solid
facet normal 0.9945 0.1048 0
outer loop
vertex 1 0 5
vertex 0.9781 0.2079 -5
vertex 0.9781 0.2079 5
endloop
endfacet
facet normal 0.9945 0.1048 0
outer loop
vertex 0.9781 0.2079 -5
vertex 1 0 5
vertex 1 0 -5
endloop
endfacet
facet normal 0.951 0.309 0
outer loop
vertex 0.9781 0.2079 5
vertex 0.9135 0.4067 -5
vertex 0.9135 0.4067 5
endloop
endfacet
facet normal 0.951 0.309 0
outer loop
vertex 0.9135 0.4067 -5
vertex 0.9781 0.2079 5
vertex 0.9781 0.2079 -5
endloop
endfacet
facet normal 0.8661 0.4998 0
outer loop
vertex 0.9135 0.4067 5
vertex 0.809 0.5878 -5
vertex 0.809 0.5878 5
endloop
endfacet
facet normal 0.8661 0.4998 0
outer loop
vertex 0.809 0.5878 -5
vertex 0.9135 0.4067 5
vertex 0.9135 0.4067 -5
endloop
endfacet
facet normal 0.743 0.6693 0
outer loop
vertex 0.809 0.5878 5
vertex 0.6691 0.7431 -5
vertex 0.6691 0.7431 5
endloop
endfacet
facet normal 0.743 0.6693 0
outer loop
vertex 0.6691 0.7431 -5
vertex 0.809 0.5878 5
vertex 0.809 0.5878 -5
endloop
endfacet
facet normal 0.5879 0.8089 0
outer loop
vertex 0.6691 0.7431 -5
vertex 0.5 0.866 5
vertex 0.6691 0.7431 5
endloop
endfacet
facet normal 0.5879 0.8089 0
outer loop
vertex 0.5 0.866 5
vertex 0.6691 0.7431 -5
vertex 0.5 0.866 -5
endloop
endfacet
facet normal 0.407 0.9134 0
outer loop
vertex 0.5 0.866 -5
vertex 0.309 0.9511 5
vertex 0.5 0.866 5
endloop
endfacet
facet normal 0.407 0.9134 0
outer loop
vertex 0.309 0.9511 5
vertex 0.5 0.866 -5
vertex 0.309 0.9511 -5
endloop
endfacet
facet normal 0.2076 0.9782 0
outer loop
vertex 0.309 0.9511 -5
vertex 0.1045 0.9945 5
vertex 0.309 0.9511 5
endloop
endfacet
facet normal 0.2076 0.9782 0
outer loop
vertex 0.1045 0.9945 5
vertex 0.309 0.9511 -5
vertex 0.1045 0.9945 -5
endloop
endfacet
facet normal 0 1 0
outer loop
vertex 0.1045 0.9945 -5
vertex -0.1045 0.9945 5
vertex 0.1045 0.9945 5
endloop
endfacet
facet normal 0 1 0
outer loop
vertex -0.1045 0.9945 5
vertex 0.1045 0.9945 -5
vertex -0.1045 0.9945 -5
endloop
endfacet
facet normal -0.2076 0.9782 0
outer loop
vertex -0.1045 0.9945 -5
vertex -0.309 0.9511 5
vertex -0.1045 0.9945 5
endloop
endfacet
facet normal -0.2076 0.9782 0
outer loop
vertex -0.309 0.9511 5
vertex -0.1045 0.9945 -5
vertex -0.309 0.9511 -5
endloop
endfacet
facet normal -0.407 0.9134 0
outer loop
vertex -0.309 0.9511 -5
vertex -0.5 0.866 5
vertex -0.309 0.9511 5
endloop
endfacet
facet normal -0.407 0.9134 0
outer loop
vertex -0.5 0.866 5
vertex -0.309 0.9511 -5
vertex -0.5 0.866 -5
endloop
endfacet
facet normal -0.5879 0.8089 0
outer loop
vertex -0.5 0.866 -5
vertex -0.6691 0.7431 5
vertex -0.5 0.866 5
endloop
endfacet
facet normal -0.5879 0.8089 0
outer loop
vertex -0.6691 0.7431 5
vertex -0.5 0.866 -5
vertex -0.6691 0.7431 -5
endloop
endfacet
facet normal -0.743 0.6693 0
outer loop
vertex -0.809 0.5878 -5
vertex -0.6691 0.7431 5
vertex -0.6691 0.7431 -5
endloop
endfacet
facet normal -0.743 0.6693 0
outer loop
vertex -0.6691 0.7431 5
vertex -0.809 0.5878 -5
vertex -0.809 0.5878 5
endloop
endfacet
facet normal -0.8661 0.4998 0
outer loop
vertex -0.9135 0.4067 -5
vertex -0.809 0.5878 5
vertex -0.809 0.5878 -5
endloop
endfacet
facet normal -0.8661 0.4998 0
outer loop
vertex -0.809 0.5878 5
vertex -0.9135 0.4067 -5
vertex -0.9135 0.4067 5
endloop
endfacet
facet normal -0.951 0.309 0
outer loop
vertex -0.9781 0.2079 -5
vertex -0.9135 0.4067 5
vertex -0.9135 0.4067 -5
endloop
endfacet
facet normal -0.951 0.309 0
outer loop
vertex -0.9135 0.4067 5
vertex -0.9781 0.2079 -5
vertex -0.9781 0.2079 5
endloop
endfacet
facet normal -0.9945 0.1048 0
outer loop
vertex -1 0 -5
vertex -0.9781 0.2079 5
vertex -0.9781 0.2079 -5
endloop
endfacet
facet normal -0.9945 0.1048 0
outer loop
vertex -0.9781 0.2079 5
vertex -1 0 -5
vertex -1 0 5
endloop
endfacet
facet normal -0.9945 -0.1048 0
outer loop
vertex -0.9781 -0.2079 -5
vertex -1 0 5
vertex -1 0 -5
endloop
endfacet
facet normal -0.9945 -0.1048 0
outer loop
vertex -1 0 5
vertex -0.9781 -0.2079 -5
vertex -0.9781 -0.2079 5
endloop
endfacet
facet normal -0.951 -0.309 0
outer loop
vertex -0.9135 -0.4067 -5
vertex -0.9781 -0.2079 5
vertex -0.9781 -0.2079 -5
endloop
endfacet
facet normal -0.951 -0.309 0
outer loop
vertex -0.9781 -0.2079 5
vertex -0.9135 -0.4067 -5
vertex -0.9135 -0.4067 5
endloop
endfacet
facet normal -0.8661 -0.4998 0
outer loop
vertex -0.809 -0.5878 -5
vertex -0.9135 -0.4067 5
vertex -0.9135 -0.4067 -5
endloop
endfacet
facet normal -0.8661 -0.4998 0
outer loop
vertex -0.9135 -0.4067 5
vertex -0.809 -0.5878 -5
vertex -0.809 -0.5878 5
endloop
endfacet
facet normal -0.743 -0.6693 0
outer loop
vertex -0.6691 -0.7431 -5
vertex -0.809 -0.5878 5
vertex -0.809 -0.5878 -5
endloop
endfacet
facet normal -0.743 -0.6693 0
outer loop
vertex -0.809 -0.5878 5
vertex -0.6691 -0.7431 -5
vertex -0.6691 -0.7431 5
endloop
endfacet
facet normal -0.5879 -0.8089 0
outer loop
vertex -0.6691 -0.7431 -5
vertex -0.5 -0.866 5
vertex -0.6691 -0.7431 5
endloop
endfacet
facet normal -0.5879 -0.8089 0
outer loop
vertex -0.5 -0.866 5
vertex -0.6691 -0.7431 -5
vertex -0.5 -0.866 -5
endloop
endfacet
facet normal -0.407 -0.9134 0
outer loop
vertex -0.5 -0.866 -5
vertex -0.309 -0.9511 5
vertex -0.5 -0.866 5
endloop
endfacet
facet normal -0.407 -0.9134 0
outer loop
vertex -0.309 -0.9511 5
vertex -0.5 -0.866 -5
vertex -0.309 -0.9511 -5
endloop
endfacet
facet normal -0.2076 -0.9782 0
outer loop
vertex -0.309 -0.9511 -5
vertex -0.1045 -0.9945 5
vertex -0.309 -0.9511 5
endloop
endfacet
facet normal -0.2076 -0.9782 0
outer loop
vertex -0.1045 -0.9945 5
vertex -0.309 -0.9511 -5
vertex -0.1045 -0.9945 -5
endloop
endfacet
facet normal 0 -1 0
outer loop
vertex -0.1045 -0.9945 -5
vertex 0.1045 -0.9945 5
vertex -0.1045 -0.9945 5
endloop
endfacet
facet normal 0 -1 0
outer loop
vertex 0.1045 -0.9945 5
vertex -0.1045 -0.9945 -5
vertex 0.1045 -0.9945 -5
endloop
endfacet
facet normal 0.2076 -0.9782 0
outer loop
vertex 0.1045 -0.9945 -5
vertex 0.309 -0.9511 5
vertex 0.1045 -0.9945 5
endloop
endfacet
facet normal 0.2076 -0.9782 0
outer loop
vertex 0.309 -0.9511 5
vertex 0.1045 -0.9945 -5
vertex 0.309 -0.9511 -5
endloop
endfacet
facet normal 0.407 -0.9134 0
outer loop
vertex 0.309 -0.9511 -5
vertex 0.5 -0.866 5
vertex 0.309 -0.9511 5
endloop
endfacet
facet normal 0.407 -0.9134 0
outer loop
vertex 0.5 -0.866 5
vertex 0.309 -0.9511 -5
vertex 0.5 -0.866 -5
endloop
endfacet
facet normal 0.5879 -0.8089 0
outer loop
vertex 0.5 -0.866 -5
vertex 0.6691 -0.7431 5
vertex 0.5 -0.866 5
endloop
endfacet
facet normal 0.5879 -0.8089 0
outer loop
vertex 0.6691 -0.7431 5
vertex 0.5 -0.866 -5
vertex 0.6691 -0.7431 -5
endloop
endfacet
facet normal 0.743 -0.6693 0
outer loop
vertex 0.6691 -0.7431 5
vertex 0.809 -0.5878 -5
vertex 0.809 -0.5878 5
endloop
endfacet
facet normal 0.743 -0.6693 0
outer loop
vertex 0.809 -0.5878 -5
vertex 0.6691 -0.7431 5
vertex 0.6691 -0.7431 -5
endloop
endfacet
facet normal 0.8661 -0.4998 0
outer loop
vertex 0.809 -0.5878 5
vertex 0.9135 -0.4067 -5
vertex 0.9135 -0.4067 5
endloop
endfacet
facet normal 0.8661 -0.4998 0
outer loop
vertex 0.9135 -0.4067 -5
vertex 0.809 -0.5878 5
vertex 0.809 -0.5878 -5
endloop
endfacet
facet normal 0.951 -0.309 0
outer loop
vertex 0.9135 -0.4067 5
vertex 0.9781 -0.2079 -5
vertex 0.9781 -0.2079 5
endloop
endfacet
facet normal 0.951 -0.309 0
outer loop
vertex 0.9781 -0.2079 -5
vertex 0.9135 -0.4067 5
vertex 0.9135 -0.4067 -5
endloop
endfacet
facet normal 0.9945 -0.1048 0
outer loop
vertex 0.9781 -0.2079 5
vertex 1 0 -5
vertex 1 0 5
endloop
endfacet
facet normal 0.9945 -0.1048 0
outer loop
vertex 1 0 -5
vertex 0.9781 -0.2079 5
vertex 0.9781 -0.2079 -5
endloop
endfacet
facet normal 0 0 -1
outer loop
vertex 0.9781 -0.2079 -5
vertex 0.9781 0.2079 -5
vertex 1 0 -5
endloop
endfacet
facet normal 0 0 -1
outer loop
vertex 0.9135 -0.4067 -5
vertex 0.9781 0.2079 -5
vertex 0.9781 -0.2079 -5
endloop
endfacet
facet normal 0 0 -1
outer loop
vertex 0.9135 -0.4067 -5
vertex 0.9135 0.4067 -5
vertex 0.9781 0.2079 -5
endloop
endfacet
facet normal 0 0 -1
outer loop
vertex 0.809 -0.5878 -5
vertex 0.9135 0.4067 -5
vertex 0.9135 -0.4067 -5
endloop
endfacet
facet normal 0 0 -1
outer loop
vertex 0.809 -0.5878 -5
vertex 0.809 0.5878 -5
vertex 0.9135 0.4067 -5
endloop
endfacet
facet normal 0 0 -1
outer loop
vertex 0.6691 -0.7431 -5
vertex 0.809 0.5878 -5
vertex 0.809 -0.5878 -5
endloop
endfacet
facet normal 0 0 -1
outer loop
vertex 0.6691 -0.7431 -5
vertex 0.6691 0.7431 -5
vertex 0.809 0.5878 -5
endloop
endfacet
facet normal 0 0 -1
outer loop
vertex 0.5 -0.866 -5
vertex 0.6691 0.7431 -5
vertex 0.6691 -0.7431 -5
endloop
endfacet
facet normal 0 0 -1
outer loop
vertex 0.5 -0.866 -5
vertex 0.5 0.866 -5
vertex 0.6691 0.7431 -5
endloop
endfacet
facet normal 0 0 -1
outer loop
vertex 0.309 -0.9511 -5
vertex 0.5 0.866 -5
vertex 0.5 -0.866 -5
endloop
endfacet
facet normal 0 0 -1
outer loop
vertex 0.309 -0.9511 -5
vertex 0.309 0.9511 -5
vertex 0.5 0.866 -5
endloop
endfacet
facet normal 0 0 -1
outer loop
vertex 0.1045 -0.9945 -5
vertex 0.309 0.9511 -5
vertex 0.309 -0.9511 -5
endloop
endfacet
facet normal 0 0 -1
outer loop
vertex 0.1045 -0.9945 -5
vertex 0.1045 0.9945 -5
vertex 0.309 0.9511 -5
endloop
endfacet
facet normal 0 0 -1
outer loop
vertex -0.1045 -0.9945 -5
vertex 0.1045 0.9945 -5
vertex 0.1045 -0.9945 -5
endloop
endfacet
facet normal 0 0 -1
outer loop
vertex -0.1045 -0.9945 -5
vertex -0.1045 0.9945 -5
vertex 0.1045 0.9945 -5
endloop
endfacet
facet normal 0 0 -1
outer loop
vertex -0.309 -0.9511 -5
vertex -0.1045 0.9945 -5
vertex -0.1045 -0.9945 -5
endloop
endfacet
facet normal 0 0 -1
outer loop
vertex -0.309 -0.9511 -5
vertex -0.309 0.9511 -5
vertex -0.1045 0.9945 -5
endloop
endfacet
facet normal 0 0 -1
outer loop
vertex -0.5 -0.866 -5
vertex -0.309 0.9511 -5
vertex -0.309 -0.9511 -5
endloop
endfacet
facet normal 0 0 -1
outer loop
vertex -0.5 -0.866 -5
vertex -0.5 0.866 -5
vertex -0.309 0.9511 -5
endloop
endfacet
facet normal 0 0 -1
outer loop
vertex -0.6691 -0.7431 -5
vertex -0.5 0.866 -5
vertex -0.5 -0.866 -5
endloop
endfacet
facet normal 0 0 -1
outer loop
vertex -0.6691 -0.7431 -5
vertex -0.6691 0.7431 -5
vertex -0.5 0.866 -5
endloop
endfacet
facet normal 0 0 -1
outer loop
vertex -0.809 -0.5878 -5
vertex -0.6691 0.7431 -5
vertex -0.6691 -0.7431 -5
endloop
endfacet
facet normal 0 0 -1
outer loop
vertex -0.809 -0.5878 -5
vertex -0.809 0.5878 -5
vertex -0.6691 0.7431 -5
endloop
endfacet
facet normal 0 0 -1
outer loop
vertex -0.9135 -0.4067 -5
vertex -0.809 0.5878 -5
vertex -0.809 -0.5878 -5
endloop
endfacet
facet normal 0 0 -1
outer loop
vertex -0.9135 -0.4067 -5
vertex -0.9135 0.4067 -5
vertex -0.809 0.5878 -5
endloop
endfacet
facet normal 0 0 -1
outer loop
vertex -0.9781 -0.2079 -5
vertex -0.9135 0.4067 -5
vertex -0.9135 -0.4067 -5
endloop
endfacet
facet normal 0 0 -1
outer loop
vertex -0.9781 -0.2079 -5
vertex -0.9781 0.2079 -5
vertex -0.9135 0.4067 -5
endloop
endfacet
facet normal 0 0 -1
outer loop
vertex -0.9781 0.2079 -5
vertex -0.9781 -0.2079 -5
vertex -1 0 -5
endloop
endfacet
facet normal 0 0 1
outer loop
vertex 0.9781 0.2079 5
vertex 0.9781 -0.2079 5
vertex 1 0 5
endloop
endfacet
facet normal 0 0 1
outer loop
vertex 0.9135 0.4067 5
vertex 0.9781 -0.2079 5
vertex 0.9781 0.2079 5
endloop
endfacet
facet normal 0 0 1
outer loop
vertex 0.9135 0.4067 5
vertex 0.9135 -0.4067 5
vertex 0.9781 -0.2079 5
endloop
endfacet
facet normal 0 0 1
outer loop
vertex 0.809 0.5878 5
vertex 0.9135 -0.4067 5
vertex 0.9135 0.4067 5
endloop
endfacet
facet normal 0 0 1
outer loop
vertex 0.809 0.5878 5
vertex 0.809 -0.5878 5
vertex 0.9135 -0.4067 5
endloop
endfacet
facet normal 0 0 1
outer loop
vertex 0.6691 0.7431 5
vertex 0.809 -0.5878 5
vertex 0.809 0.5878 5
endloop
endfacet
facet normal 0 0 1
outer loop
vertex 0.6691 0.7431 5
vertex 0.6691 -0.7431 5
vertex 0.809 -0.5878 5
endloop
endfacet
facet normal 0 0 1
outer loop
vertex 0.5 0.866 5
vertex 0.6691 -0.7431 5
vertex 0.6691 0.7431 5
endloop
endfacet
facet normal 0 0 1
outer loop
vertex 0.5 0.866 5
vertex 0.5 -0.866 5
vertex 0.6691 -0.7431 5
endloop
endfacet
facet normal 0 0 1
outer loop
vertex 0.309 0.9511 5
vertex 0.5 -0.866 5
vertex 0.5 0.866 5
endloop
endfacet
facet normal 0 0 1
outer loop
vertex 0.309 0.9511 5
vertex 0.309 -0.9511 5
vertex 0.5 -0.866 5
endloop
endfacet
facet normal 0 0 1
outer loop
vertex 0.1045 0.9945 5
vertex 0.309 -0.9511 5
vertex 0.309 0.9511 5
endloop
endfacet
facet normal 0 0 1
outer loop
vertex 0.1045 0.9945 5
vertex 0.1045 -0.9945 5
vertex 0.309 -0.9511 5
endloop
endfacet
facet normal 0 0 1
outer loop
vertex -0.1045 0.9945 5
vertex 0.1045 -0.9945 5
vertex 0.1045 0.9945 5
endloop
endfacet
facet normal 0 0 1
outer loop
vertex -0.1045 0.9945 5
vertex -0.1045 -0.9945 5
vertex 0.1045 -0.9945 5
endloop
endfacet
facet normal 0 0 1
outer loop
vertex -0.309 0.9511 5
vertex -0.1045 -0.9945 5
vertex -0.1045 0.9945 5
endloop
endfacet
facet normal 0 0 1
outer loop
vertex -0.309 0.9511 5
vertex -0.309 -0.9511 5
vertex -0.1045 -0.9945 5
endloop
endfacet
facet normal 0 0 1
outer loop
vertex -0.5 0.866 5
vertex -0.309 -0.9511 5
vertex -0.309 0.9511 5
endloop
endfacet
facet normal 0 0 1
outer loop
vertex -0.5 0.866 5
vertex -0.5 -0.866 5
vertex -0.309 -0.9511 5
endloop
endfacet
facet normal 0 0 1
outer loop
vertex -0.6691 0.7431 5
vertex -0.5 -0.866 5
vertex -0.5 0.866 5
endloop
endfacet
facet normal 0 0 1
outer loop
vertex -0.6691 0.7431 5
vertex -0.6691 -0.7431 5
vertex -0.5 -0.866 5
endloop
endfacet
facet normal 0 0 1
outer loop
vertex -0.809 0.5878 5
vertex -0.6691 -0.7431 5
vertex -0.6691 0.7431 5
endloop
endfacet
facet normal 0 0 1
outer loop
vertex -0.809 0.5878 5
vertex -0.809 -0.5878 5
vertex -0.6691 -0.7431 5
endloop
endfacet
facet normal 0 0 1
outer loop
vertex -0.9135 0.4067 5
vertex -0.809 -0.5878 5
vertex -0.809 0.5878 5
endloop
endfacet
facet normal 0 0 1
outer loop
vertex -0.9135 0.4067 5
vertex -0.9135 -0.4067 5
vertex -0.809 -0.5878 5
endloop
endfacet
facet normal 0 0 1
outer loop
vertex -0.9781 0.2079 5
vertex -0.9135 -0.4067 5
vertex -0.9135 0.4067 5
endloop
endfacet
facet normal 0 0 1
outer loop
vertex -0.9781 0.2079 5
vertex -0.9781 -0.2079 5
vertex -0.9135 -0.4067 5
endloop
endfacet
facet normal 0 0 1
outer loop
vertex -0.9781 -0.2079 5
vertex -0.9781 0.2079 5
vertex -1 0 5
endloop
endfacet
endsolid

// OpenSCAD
// @author: Cédric BERTELETTI


module m2_trou_vis(hauteur=10) {
    cylinder(h=hauteur, r1=1, r2=1, center=true, $fn=30);
}

module m2_trou_insert(hauteur=10) {
    cylinder(h=hauteur, r1=1.6, r2=1.6, center=true, $fn=30);
}

module m3_trou_vis(hauteur=10) {
    cylinder(h=hauteur, r1=1.5, r2=1.5, center=true, $fn=30);
}

module m3_trou_insert(hauteur=10) {
    cylinder(h=hauteur, r1=2, r2=2, center=true, $fn=30);
}


m2_trou_vis();
